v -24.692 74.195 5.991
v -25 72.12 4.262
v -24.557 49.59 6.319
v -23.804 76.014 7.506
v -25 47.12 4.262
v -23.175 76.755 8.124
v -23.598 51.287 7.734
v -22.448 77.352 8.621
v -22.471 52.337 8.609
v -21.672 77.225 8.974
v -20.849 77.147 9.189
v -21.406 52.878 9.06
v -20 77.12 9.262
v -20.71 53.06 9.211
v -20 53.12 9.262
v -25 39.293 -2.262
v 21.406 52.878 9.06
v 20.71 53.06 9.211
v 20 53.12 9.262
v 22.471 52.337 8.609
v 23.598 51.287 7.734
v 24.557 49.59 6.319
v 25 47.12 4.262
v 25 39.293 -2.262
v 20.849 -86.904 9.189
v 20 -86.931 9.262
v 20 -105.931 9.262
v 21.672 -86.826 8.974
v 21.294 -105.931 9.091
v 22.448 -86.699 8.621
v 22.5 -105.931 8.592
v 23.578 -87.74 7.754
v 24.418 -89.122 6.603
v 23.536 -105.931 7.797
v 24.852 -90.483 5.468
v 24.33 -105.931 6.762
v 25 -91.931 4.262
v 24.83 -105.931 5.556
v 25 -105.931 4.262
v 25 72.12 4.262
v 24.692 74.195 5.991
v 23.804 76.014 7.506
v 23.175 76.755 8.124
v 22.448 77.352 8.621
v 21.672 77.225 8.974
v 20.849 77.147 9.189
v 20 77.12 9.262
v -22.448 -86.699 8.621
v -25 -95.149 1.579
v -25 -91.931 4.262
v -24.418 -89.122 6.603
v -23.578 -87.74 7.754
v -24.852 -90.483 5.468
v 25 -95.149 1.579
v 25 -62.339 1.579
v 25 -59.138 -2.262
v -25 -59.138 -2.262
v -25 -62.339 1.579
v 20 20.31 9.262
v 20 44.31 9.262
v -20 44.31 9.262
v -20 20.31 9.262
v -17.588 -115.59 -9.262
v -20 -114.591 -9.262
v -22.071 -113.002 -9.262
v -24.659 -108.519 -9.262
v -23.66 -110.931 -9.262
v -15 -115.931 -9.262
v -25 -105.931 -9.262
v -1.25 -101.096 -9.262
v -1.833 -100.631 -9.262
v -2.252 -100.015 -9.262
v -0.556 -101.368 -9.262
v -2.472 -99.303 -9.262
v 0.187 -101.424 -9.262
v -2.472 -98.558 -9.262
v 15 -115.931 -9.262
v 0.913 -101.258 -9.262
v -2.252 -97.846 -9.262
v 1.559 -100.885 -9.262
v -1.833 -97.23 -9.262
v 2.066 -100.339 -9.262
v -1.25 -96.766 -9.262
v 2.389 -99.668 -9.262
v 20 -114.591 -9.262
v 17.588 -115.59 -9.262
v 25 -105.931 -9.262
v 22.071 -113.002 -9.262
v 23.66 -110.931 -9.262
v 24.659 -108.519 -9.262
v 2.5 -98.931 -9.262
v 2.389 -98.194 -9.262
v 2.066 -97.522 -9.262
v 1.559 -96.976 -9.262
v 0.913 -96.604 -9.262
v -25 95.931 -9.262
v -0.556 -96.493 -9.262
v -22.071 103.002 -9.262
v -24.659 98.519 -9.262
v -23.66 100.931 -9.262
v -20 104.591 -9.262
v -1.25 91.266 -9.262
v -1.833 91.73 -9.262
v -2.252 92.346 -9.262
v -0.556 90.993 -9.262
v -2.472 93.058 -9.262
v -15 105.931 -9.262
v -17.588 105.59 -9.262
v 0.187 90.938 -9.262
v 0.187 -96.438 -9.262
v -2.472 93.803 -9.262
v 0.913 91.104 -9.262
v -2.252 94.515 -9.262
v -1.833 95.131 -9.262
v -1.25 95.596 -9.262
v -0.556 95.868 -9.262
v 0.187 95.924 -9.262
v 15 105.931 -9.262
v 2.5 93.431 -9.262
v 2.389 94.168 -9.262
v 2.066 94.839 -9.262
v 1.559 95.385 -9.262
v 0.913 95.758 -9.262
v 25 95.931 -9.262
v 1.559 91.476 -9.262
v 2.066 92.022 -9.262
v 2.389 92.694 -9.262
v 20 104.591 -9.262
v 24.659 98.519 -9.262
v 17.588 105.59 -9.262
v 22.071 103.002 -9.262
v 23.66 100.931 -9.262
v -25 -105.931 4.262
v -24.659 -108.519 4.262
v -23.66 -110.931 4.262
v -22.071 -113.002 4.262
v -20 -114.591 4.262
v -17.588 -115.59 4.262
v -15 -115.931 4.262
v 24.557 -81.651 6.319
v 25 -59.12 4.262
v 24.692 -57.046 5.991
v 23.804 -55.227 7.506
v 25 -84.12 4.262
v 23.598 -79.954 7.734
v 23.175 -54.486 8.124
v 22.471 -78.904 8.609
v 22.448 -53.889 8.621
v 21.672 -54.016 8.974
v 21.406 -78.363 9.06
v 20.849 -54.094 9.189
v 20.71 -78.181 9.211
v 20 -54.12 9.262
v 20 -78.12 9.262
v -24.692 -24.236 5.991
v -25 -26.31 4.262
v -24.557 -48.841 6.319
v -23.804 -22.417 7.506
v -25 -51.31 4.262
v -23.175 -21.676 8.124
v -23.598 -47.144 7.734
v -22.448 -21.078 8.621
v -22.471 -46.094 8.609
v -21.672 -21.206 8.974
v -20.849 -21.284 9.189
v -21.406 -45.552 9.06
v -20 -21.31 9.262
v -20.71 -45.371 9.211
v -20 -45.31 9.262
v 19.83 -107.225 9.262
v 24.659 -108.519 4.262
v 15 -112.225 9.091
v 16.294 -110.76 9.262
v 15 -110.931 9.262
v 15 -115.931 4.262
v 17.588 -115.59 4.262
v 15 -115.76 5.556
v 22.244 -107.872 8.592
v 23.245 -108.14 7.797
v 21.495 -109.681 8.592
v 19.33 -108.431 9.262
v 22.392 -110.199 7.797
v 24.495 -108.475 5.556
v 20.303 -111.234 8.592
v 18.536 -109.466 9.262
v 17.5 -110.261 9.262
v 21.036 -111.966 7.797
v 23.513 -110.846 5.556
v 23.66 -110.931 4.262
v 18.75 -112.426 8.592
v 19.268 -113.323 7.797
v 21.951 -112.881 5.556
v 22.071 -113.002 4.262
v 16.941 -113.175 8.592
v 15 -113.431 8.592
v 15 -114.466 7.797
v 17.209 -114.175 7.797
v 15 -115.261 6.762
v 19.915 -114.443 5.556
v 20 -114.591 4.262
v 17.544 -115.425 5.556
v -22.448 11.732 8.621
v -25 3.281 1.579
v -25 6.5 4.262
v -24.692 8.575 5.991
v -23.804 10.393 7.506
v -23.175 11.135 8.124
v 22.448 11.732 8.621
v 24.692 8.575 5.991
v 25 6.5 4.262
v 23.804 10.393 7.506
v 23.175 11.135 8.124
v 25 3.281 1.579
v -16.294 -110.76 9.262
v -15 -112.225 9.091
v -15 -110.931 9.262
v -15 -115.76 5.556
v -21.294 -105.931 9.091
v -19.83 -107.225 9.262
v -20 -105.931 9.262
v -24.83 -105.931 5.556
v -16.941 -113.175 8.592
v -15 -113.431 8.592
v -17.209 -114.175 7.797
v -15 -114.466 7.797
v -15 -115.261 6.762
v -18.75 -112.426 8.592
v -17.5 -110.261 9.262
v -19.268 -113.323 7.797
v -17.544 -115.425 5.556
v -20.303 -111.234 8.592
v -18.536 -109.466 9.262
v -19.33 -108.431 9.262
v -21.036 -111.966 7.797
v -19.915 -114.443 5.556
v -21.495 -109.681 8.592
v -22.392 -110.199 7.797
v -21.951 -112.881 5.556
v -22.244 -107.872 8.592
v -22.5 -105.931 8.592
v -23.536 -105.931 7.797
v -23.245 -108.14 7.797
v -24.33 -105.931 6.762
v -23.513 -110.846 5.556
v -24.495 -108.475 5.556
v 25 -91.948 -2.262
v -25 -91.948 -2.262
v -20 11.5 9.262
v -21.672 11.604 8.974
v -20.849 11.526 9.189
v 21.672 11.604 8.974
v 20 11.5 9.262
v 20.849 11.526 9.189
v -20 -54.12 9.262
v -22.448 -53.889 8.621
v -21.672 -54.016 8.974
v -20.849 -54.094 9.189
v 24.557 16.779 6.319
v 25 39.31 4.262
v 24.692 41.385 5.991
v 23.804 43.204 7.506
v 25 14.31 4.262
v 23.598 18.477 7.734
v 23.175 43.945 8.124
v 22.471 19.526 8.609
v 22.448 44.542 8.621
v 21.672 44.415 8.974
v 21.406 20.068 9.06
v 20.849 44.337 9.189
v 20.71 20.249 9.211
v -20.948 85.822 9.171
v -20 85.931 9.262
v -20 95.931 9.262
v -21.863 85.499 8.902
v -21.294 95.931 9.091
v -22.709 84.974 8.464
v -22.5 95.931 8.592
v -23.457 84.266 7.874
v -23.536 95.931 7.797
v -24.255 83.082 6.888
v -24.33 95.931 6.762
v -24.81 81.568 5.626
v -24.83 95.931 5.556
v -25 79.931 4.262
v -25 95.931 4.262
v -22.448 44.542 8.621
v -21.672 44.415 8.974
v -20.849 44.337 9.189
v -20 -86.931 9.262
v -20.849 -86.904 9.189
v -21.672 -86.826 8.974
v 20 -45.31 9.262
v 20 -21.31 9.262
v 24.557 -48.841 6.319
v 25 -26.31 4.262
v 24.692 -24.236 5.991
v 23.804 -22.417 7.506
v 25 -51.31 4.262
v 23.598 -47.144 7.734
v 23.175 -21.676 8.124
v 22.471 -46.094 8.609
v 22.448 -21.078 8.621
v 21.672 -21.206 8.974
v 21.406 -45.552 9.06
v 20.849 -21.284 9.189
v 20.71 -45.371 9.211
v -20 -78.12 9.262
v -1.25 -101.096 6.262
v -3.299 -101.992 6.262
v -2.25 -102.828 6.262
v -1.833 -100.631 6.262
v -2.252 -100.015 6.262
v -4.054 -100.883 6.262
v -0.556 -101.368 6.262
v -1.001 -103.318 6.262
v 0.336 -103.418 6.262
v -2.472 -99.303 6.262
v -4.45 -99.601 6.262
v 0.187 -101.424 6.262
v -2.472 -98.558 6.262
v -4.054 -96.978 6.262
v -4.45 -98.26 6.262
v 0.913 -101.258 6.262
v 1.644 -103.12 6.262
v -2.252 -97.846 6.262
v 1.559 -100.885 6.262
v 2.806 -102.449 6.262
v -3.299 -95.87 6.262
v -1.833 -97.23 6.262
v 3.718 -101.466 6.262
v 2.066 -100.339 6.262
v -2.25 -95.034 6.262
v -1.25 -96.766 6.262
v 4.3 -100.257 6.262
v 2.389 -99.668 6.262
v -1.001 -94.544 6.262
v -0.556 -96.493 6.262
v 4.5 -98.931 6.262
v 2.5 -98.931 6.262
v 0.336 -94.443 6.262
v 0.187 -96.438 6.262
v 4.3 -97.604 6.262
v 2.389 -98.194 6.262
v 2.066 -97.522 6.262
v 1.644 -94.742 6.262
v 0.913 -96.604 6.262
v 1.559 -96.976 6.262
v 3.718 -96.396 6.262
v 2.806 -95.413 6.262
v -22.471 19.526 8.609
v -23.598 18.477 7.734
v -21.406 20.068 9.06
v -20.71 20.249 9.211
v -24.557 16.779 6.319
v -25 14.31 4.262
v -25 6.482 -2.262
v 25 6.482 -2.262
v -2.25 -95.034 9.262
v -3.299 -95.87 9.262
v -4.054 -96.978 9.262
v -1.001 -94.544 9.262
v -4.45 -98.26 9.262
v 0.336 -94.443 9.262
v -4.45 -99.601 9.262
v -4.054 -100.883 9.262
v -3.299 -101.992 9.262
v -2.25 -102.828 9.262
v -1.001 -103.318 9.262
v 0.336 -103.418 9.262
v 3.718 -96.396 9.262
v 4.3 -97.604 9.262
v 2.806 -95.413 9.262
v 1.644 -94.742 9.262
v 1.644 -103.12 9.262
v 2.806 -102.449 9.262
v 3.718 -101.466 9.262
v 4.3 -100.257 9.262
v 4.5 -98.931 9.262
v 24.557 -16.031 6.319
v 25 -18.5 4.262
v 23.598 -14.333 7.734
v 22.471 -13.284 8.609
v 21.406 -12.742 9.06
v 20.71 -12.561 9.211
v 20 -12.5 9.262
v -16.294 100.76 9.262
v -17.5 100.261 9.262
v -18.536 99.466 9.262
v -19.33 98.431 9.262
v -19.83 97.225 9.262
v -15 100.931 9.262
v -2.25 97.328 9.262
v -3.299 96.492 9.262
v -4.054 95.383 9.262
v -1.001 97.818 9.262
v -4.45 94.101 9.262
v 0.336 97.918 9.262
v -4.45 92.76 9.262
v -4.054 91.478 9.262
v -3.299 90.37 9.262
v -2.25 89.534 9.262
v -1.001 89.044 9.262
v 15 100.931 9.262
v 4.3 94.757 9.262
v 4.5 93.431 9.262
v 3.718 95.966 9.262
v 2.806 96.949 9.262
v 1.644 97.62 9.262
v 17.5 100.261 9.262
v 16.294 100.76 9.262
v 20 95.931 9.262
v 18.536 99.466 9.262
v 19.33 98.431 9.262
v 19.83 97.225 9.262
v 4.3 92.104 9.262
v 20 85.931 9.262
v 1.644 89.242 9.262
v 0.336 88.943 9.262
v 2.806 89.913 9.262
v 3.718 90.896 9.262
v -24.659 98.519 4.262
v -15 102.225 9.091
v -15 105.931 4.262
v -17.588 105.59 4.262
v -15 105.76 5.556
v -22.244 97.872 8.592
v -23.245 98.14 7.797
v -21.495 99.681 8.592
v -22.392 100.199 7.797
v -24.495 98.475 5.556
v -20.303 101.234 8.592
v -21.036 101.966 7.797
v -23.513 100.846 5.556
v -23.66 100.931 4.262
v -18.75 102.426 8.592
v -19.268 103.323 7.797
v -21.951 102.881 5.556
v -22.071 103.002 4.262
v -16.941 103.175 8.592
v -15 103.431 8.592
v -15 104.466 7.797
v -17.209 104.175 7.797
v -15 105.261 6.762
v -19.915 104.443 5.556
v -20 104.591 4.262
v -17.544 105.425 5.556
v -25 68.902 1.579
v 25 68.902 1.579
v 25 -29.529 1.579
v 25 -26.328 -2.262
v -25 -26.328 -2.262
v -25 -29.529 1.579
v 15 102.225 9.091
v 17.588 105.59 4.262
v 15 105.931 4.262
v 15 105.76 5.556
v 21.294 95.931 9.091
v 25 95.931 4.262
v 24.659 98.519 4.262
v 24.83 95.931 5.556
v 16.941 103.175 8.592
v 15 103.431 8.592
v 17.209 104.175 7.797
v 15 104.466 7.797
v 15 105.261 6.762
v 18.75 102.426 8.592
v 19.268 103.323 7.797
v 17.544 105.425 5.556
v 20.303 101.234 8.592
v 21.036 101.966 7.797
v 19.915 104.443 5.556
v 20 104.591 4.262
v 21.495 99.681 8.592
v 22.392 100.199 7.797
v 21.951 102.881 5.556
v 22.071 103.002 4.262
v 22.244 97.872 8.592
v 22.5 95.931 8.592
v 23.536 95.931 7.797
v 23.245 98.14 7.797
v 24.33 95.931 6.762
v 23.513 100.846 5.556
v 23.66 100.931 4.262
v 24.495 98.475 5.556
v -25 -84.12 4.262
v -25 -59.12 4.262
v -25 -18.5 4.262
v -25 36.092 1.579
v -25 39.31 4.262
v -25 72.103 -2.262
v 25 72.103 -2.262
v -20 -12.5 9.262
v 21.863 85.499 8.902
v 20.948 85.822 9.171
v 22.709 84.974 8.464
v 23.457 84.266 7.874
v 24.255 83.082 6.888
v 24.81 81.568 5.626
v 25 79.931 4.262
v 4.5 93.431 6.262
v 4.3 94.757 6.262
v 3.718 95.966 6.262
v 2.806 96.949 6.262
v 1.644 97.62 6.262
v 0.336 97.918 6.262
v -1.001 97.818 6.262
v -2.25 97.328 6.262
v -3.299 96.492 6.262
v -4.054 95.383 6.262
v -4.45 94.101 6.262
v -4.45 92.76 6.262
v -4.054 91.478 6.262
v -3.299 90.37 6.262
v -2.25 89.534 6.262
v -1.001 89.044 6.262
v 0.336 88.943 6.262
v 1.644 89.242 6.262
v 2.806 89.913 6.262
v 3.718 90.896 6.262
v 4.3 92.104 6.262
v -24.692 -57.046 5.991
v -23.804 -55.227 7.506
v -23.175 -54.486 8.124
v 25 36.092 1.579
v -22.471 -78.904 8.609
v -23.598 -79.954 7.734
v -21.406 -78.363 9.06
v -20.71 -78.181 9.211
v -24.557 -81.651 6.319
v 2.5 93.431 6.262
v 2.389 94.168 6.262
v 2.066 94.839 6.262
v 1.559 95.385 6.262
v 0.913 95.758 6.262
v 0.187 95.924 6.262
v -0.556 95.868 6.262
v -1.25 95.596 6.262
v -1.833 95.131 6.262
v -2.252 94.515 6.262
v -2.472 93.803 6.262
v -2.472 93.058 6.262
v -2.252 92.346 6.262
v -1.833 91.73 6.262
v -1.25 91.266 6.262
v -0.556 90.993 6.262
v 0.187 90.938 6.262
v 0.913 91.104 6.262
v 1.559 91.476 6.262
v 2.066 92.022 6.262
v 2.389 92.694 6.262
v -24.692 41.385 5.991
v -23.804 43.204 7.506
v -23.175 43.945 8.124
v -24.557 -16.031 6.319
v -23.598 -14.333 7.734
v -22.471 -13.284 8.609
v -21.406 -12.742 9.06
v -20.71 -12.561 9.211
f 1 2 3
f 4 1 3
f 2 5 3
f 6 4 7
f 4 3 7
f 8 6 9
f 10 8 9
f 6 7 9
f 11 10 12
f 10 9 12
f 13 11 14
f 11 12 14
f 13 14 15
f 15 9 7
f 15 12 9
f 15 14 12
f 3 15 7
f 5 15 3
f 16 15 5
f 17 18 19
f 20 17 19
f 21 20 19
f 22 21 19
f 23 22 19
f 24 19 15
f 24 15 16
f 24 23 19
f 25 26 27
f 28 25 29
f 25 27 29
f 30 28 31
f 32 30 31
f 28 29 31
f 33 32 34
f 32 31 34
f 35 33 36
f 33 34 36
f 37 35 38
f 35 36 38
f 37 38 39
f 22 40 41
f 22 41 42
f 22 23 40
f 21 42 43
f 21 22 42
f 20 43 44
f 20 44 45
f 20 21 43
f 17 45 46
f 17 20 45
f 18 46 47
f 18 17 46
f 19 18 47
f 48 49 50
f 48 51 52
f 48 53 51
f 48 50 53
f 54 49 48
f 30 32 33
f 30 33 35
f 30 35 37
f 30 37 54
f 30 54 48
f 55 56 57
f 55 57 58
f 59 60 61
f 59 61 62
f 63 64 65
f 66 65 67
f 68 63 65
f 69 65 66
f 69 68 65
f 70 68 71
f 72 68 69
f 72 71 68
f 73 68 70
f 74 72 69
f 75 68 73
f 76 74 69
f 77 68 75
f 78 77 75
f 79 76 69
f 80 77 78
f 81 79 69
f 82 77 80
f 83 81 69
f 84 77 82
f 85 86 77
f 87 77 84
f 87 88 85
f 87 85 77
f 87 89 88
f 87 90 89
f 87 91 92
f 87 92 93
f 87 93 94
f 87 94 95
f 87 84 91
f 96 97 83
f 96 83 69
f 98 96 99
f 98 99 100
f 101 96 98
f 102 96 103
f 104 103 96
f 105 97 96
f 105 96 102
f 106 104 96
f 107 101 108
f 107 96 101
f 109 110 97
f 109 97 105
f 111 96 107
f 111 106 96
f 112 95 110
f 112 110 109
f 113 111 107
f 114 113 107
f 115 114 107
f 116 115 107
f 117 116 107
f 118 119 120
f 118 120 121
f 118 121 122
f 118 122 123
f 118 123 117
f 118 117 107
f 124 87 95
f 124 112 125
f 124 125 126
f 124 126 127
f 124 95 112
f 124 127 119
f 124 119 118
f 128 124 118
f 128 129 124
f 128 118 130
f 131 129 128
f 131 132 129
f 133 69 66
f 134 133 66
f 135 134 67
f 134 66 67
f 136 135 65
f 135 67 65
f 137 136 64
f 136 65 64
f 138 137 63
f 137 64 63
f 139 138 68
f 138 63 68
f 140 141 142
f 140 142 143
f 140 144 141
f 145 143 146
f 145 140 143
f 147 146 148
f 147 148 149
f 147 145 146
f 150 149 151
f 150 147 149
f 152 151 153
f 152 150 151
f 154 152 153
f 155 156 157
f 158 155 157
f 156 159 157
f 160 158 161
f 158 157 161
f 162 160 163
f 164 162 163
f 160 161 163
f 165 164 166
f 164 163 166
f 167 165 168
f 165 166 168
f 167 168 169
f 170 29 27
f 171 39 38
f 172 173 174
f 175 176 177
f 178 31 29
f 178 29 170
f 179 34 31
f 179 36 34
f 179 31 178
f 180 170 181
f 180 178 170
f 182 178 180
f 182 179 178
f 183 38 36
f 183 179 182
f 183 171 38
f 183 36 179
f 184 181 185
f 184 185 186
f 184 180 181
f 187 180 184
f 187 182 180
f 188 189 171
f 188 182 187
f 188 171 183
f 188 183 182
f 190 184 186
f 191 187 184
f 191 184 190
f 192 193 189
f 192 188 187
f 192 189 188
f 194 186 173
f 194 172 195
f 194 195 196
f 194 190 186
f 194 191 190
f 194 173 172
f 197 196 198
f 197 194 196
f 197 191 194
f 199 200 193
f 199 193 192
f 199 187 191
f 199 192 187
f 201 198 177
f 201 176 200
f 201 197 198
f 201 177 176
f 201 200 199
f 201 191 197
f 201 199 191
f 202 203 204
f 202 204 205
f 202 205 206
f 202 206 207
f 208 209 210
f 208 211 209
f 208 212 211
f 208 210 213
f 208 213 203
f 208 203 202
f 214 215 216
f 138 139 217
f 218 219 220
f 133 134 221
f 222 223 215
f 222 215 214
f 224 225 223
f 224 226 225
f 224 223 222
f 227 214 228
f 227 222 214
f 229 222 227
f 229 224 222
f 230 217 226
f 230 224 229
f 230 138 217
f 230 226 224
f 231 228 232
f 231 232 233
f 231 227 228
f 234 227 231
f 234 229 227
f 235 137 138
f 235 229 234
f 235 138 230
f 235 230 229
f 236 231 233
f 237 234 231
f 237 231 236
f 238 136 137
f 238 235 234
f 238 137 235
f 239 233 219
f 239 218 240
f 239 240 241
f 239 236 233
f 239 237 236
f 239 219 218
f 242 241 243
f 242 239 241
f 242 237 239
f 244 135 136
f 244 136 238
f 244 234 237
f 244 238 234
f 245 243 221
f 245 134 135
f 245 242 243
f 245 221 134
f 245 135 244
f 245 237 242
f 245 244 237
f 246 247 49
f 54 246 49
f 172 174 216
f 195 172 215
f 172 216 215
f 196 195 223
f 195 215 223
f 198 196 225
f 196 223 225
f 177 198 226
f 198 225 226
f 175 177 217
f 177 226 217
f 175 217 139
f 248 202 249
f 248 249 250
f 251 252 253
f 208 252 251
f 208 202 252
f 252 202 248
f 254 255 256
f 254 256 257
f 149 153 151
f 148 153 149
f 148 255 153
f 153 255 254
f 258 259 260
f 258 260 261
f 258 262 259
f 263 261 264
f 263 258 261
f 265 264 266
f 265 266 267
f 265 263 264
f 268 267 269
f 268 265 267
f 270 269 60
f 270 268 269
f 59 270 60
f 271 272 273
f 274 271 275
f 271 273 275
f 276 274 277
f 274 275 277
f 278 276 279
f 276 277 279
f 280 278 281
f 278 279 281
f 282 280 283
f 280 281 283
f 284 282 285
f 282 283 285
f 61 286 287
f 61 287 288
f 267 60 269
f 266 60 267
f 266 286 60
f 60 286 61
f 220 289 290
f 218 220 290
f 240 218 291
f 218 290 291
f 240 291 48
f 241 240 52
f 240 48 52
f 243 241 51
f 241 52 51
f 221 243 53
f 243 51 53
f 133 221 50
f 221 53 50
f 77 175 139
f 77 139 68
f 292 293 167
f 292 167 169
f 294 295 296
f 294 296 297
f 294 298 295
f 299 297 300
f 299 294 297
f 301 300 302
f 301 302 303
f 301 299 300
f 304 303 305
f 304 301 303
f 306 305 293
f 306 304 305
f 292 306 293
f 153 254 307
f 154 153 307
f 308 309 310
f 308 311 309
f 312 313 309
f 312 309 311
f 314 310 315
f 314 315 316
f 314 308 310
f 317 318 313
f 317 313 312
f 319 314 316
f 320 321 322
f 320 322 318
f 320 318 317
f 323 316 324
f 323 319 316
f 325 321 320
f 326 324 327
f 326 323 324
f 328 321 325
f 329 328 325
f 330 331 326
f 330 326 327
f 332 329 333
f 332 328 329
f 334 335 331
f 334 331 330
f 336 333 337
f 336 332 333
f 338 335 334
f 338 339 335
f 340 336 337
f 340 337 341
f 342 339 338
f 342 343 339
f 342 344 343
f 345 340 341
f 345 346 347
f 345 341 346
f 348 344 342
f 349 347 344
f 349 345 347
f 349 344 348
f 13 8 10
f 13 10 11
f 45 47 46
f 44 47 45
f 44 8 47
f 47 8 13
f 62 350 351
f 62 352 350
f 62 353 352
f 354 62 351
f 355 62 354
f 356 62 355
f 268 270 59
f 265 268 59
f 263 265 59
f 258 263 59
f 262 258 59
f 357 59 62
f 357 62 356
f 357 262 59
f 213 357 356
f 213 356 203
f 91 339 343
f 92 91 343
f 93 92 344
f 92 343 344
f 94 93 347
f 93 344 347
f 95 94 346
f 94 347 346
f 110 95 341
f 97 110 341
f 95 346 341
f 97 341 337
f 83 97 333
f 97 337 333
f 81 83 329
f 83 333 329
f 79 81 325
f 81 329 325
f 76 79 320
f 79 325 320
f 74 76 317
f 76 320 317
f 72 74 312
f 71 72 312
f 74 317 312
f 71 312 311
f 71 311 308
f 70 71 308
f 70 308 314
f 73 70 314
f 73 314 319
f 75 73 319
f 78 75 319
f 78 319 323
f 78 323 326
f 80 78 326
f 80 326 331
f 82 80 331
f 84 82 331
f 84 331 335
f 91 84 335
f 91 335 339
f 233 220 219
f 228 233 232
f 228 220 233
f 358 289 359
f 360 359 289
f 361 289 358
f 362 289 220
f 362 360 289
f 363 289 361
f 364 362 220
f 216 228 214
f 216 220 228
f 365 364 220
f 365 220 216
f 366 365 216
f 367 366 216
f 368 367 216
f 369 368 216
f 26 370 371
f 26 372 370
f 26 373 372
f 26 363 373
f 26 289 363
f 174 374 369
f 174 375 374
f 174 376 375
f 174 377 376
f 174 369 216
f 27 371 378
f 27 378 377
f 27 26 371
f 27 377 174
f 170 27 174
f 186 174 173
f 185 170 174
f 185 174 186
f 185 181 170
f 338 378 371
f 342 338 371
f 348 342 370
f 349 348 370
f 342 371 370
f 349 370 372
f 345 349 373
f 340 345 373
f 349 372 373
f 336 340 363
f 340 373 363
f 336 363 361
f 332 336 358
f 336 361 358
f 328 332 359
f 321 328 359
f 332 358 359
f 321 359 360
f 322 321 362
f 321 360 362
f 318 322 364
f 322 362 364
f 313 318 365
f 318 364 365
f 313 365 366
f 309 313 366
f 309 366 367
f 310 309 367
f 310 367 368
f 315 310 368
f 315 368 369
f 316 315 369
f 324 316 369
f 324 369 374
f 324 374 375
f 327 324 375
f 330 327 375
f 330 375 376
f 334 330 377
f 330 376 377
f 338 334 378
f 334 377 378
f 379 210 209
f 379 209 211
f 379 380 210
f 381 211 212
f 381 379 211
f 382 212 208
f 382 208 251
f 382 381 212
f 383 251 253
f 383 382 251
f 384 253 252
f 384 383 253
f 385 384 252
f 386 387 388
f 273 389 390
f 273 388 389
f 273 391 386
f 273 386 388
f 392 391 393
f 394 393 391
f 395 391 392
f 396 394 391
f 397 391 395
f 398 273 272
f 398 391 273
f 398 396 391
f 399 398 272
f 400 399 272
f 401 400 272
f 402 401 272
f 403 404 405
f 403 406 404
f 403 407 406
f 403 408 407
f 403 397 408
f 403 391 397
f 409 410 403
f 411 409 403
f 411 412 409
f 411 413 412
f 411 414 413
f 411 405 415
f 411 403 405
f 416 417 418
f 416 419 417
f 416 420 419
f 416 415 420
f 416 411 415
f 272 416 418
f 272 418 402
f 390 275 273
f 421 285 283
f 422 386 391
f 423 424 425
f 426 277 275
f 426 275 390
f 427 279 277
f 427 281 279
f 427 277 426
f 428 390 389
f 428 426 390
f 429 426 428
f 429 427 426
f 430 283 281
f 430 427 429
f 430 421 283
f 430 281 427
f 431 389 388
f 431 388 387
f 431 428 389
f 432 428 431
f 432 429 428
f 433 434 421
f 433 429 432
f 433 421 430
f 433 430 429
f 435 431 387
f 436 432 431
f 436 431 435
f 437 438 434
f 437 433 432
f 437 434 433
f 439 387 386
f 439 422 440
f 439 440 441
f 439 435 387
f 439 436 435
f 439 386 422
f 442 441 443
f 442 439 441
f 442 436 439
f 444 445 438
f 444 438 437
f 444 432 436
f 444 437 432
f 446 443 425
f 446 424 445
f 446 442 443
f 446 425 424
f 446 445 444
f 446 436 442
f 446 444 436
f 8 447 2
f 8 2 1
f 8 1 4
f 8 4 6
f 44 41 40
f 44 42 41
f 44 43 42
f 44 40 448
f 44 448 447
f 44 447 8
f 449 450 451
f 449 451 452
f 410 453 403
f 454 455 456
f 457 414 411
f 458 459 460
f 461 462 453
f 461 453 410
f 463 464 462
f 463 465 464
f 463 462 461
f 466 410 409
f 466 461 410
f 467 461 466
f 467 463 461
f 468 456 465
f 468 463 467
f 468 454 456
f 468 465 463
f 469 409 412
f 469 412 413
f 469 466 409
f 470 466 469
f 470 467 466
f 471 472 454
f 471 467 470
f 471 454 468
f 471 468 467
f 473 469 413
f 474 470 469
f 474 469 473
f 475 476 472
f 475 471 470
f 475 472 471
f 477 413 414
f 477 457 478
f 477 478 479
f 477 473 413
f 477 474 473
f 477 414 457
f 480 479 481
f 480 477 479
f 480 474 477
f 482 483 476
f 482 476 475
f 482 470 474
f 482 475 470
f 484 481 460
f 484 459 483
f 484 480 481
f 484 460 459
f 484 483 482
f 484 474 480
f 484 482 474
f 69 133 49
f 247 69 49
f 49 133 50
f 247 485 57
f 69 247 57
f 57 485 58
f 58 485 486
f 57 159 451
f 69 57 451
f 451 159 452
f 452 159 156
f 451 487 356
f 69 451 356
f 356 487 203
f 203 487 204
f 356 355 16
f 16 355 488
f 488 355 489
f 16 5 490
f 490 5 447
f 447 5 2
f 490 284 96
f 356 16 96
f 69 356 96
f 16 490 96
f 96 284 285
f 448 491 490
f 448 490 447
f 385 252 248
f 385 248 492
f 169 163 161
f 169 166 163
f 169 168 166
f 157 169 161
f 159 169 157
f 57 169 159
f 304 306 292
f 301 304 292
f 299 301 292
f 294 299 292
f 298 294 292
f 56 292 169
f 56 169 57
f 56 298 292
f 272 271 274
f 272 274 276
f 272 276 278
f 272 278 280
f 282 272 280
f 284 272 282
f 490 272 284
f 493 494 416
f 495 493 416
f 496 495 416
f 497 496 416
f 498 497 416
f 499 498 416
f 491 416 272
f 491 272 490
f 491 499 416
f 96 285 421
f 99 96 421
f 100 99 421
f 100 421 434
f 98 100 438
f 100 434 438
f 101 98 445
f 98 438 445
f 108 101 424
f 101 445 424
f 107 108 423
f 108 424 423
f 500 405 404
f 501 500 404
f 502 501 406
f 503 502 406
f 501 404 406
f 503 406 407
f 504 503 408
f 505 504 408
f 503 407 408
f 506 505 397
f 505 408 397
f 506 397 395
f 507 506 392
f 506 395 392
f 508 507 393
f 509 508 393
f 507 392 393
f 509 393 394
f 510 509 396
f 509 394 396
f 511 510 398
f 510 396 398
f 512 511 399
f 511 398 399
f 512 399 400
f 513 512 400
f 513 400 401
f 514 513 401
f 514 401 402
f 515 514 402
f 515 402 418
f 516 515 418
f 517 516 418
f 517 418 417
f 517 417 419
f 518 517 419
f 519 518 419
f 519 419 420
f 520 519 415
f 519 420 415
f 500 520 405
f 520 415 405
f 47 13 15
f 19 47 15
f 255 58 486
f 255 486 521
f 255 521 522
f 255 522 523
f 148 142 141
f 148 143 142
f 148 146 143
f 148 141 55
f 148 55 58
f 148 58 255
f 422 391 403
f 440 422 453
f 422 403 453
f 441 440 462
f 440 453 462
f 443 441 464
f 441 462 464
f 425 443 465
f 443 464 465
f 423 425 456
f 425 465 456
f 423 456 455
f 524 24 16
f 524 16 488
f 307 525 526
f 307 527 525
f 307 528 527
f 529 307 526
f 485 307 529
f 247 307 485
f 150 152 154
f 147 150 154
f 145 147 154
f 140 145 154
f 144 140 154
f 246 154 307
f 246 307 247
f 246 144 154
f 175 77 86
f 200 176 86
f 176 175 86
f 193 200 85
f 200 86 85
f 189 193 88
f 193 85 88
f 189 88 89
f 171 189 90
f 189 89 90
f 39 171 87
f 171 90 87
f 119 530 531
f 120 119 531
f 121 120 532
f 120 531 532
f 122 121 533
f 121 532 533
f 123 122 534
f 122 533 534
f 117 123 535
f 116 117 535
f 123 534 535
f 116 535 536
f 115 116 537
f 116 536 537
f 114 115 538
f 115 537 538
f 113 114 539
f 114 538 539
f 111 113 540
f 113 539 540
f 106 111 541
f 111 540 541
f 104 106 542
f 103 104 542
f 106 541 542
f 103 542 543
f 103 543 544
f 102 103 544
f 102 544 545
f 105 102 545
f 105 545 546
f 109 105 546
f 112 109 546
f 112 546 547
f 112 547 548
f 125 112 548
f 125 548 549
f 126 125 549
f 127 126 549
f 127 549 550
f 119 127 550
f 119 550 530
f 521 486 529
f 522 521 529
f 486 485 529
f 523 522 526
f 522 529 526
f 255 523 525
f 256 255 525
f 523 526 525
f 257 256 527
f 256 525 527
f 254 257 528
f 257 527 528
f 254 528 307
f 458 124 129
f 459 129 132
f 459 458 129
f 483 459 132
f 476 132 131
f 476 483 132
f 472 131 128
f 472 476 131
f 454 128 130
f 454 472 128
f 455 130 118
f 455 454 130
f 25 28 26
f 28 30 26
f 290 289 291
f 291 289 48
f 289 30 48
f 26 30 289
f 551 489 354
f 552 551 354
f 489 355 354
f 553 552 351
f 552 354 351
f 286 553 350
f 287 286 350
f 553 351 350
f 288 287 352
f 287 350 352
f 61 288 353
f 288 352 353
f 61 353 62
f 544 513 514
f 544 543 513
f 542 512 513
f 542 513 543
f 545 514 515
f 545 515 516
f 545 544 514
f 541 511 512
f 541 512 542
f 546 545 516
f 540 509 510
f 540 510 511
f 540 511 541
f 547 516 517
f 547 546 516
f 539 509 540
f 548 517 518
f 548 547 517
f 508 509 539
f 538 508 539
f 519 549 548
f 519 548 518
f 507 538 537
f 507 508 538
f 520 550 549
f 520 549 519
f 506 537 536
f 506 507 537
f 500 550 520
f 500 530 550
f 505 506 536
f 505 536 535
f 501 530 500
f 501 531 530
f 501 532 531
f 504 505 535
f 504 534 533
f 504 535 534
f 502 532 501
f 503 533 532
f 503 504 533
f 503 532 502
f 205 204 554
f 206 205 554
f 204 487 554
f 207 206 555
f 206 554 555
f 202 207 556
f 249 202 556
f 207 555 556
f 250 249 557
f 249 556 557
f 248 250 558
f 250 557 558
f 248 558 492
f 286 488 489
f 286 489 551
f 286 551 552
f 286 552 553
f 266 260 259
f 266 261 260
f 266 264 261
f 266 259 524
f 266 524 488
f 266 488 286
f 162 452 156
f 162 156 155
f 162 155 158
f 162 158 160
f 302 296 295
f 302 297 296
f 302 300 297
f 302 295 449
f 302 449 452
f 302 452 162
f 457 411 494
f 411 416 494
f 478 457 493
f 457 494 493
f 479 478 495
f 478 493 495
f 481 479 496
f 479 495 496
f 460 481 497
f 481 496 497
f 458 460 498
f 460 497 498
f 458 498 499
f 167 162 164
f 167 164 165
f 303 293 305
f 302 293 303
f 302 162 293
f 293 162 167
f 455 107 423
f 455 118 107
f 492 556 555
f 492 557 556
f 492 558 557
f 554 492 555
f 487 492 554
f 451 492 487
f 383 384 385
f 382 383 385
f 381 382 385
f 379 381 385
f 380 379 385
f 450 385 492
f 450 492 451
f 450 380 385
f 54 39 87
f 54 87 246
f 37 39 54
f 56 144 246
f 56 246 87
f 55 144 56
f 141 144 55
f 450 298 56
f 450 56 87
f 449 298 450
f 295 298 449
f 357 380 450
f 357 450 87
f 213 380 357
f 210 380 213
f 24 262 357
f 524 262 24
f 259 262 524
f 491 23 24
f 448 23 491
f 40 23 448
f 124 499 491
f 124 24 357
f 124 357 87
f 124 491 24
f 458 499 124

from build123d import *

# Parameters (mm, degrees)
F1_DEPTH  = 25
F2_SIZE   = 1
F3_R      = 10
F4_R      = 5
F5_R      = 2.5
F6_DEPTH  = 25
F5_R_2    = 4.5
F7_DEPTH  = 3
F8_R      = 2.5
F9_DEPTH  = 25
F8_R_2    = 4.5
F10_DEPTH = 3


with BuildPart() as f1:
    # F0 (on Right) → F1 (new body, symmetric)
    with BuildSketch(Plane.YZ):
        Polygon((-115.9307490277, -9.261659597), (-105.9307490277, -9.261659597), (105.9307490277, -9.261659597), (105.9307490277, 9.261659597), (85.9307490277, 9.261659597), (72.102765995, -2.261659597), (68.9018439966, 1.579446801), (78.1204993518, 9.261659597), (53.1204993518, 9.261659597), (39.2925163191, -2.261659597), (36.0915943207, 1.579446801), (45.3102496759, 9.261659597), (20.3102496759, 9.261659597), (6.4822666432, -2.261659597), (3.2813446448, 1.579446801), (12.5, 9.261659597), (-12.5, 9.261659597), (-26.3279830328, -2.261659597), (-29.5289050311, 1.579446801), (-20.3102496759, 9.261659597), (-45.3102496759, 9.261659597), (-59.1382327087, -2.261659597), (-62.339154707, 1.579446801), (-53.1204993518, 9.261659597), (-78.1204993518, 9.261659597), (-91.9484823846, -2.261659597), (-95.1494043829, 1.579446801), (-85.9307490277, 9.261659597), (-105.9307490277, 9.261659597), (-115.9307490277, 9.261659597), align=None)
    extrude(amount=F1_DEPTH, both=True)

    # F2
    f2_edges = [f1.edges().sort_by_distance(p)[0] for p in [
        (0, -85.930749, 9.26166),
        (0, -53.120499, 9.26166),
        (0, -20.31025, 9.26166),
        (0, 12.5, 9.26166),
        (0, 45.31025, 9.26166),
        (0, 78.120499, 9.26166),
    ]]
    chamfer(f2_edges, length=F2_SIZE)

    # F3
    f3_edges = [f1.edges().sort_by_distance(p)[0] for p in [
        (25, -115.930749, 0),
        (-25, -115.930749, 0),
        (25, 105.930749, 0),
        (-25, 105.930749, 0),
    ]]
    fillet(f3_edges, radius=F3_R)

    # F4
    f4_edges = [f1.edges().sort_by_distance(p)[0] for p in [
        (0, 105.930749, 9.26166),
        (22.071068, 103.001817, 9.26166),
        (25, 90.930749, 9.26166),
        (25, 65.120499, 9.26166),
        (25, 32.31025, 9.26166),
        (25, -0.5, 9.26166),
        (25, -33.31025, 9.26166),
        (25, -66.120499, 9.26166),
        (25, -96.430749, 9.26166),
        (22.071068, -113.001817, 9.26166),
        (0, -115.930749, 9.26166),
        (-22.071068, -113.001817, 9.26166),
        (-25, -96.430749, 9.26166),
        (-25, -66.120499, 9.26166),
        (-25, -33.31025, 9.26166),
        (-25, -0.5, 9.26166),
        (-25, 32.31025, 9.26166),
        (-25, 65.120499, 9.26166),
        (-22.071068, 103.001817, 9.26166),
    ]]
    fillet(f4_edges, radius=F4_R)

    # F5 (on face) → F6 (cut)
    with BuildSketch(Plane.XY.offset(9.261659597)):
        with Locations((0, -98.9307490277)):
            Circle(F5_R)
    extrude(amount=-F6_DEPTH, mode=Mode.SUBTRACT)

    # F5 (on face) → F7 (cut)
    with BuildSketch(Plane.XY.offset(9.261659597)):
        with Locations((0, -98.9307490277)):
            Circle(F5_R_2)
        with Locations((0, -98.9307490277)):
            Circle(F5_R, mode=Mode.SUBTRACT)
    extrude(amount=-F7_DEPTH, mode=Mode.SUBTRACT)

    # F8 (on face) → F9 (cut)
    with BuildSketch(Plane.XY.offset(9.261659597)):
        with Locations((0, 93.4307490277)):
            Circle(F8_R)
    extrude(amount=-F9_DEPTH, mode=Mode.SUBTRACT)

    # F8 (on face) → F10 (cut)
    with BuildSketch(Plane.XY.offset(9.261659597)):
        with Locations((0, 93.4307490277)):
            Circle(F8_R_2)
        with Locations((0, 93.4307490277)):
            Circle(F8_R, mode=Mode.SUBTRACT)
    extrude(amount=-F10_DEPTH, mode=Mode.SUBTRACT)


solid = f1.part
